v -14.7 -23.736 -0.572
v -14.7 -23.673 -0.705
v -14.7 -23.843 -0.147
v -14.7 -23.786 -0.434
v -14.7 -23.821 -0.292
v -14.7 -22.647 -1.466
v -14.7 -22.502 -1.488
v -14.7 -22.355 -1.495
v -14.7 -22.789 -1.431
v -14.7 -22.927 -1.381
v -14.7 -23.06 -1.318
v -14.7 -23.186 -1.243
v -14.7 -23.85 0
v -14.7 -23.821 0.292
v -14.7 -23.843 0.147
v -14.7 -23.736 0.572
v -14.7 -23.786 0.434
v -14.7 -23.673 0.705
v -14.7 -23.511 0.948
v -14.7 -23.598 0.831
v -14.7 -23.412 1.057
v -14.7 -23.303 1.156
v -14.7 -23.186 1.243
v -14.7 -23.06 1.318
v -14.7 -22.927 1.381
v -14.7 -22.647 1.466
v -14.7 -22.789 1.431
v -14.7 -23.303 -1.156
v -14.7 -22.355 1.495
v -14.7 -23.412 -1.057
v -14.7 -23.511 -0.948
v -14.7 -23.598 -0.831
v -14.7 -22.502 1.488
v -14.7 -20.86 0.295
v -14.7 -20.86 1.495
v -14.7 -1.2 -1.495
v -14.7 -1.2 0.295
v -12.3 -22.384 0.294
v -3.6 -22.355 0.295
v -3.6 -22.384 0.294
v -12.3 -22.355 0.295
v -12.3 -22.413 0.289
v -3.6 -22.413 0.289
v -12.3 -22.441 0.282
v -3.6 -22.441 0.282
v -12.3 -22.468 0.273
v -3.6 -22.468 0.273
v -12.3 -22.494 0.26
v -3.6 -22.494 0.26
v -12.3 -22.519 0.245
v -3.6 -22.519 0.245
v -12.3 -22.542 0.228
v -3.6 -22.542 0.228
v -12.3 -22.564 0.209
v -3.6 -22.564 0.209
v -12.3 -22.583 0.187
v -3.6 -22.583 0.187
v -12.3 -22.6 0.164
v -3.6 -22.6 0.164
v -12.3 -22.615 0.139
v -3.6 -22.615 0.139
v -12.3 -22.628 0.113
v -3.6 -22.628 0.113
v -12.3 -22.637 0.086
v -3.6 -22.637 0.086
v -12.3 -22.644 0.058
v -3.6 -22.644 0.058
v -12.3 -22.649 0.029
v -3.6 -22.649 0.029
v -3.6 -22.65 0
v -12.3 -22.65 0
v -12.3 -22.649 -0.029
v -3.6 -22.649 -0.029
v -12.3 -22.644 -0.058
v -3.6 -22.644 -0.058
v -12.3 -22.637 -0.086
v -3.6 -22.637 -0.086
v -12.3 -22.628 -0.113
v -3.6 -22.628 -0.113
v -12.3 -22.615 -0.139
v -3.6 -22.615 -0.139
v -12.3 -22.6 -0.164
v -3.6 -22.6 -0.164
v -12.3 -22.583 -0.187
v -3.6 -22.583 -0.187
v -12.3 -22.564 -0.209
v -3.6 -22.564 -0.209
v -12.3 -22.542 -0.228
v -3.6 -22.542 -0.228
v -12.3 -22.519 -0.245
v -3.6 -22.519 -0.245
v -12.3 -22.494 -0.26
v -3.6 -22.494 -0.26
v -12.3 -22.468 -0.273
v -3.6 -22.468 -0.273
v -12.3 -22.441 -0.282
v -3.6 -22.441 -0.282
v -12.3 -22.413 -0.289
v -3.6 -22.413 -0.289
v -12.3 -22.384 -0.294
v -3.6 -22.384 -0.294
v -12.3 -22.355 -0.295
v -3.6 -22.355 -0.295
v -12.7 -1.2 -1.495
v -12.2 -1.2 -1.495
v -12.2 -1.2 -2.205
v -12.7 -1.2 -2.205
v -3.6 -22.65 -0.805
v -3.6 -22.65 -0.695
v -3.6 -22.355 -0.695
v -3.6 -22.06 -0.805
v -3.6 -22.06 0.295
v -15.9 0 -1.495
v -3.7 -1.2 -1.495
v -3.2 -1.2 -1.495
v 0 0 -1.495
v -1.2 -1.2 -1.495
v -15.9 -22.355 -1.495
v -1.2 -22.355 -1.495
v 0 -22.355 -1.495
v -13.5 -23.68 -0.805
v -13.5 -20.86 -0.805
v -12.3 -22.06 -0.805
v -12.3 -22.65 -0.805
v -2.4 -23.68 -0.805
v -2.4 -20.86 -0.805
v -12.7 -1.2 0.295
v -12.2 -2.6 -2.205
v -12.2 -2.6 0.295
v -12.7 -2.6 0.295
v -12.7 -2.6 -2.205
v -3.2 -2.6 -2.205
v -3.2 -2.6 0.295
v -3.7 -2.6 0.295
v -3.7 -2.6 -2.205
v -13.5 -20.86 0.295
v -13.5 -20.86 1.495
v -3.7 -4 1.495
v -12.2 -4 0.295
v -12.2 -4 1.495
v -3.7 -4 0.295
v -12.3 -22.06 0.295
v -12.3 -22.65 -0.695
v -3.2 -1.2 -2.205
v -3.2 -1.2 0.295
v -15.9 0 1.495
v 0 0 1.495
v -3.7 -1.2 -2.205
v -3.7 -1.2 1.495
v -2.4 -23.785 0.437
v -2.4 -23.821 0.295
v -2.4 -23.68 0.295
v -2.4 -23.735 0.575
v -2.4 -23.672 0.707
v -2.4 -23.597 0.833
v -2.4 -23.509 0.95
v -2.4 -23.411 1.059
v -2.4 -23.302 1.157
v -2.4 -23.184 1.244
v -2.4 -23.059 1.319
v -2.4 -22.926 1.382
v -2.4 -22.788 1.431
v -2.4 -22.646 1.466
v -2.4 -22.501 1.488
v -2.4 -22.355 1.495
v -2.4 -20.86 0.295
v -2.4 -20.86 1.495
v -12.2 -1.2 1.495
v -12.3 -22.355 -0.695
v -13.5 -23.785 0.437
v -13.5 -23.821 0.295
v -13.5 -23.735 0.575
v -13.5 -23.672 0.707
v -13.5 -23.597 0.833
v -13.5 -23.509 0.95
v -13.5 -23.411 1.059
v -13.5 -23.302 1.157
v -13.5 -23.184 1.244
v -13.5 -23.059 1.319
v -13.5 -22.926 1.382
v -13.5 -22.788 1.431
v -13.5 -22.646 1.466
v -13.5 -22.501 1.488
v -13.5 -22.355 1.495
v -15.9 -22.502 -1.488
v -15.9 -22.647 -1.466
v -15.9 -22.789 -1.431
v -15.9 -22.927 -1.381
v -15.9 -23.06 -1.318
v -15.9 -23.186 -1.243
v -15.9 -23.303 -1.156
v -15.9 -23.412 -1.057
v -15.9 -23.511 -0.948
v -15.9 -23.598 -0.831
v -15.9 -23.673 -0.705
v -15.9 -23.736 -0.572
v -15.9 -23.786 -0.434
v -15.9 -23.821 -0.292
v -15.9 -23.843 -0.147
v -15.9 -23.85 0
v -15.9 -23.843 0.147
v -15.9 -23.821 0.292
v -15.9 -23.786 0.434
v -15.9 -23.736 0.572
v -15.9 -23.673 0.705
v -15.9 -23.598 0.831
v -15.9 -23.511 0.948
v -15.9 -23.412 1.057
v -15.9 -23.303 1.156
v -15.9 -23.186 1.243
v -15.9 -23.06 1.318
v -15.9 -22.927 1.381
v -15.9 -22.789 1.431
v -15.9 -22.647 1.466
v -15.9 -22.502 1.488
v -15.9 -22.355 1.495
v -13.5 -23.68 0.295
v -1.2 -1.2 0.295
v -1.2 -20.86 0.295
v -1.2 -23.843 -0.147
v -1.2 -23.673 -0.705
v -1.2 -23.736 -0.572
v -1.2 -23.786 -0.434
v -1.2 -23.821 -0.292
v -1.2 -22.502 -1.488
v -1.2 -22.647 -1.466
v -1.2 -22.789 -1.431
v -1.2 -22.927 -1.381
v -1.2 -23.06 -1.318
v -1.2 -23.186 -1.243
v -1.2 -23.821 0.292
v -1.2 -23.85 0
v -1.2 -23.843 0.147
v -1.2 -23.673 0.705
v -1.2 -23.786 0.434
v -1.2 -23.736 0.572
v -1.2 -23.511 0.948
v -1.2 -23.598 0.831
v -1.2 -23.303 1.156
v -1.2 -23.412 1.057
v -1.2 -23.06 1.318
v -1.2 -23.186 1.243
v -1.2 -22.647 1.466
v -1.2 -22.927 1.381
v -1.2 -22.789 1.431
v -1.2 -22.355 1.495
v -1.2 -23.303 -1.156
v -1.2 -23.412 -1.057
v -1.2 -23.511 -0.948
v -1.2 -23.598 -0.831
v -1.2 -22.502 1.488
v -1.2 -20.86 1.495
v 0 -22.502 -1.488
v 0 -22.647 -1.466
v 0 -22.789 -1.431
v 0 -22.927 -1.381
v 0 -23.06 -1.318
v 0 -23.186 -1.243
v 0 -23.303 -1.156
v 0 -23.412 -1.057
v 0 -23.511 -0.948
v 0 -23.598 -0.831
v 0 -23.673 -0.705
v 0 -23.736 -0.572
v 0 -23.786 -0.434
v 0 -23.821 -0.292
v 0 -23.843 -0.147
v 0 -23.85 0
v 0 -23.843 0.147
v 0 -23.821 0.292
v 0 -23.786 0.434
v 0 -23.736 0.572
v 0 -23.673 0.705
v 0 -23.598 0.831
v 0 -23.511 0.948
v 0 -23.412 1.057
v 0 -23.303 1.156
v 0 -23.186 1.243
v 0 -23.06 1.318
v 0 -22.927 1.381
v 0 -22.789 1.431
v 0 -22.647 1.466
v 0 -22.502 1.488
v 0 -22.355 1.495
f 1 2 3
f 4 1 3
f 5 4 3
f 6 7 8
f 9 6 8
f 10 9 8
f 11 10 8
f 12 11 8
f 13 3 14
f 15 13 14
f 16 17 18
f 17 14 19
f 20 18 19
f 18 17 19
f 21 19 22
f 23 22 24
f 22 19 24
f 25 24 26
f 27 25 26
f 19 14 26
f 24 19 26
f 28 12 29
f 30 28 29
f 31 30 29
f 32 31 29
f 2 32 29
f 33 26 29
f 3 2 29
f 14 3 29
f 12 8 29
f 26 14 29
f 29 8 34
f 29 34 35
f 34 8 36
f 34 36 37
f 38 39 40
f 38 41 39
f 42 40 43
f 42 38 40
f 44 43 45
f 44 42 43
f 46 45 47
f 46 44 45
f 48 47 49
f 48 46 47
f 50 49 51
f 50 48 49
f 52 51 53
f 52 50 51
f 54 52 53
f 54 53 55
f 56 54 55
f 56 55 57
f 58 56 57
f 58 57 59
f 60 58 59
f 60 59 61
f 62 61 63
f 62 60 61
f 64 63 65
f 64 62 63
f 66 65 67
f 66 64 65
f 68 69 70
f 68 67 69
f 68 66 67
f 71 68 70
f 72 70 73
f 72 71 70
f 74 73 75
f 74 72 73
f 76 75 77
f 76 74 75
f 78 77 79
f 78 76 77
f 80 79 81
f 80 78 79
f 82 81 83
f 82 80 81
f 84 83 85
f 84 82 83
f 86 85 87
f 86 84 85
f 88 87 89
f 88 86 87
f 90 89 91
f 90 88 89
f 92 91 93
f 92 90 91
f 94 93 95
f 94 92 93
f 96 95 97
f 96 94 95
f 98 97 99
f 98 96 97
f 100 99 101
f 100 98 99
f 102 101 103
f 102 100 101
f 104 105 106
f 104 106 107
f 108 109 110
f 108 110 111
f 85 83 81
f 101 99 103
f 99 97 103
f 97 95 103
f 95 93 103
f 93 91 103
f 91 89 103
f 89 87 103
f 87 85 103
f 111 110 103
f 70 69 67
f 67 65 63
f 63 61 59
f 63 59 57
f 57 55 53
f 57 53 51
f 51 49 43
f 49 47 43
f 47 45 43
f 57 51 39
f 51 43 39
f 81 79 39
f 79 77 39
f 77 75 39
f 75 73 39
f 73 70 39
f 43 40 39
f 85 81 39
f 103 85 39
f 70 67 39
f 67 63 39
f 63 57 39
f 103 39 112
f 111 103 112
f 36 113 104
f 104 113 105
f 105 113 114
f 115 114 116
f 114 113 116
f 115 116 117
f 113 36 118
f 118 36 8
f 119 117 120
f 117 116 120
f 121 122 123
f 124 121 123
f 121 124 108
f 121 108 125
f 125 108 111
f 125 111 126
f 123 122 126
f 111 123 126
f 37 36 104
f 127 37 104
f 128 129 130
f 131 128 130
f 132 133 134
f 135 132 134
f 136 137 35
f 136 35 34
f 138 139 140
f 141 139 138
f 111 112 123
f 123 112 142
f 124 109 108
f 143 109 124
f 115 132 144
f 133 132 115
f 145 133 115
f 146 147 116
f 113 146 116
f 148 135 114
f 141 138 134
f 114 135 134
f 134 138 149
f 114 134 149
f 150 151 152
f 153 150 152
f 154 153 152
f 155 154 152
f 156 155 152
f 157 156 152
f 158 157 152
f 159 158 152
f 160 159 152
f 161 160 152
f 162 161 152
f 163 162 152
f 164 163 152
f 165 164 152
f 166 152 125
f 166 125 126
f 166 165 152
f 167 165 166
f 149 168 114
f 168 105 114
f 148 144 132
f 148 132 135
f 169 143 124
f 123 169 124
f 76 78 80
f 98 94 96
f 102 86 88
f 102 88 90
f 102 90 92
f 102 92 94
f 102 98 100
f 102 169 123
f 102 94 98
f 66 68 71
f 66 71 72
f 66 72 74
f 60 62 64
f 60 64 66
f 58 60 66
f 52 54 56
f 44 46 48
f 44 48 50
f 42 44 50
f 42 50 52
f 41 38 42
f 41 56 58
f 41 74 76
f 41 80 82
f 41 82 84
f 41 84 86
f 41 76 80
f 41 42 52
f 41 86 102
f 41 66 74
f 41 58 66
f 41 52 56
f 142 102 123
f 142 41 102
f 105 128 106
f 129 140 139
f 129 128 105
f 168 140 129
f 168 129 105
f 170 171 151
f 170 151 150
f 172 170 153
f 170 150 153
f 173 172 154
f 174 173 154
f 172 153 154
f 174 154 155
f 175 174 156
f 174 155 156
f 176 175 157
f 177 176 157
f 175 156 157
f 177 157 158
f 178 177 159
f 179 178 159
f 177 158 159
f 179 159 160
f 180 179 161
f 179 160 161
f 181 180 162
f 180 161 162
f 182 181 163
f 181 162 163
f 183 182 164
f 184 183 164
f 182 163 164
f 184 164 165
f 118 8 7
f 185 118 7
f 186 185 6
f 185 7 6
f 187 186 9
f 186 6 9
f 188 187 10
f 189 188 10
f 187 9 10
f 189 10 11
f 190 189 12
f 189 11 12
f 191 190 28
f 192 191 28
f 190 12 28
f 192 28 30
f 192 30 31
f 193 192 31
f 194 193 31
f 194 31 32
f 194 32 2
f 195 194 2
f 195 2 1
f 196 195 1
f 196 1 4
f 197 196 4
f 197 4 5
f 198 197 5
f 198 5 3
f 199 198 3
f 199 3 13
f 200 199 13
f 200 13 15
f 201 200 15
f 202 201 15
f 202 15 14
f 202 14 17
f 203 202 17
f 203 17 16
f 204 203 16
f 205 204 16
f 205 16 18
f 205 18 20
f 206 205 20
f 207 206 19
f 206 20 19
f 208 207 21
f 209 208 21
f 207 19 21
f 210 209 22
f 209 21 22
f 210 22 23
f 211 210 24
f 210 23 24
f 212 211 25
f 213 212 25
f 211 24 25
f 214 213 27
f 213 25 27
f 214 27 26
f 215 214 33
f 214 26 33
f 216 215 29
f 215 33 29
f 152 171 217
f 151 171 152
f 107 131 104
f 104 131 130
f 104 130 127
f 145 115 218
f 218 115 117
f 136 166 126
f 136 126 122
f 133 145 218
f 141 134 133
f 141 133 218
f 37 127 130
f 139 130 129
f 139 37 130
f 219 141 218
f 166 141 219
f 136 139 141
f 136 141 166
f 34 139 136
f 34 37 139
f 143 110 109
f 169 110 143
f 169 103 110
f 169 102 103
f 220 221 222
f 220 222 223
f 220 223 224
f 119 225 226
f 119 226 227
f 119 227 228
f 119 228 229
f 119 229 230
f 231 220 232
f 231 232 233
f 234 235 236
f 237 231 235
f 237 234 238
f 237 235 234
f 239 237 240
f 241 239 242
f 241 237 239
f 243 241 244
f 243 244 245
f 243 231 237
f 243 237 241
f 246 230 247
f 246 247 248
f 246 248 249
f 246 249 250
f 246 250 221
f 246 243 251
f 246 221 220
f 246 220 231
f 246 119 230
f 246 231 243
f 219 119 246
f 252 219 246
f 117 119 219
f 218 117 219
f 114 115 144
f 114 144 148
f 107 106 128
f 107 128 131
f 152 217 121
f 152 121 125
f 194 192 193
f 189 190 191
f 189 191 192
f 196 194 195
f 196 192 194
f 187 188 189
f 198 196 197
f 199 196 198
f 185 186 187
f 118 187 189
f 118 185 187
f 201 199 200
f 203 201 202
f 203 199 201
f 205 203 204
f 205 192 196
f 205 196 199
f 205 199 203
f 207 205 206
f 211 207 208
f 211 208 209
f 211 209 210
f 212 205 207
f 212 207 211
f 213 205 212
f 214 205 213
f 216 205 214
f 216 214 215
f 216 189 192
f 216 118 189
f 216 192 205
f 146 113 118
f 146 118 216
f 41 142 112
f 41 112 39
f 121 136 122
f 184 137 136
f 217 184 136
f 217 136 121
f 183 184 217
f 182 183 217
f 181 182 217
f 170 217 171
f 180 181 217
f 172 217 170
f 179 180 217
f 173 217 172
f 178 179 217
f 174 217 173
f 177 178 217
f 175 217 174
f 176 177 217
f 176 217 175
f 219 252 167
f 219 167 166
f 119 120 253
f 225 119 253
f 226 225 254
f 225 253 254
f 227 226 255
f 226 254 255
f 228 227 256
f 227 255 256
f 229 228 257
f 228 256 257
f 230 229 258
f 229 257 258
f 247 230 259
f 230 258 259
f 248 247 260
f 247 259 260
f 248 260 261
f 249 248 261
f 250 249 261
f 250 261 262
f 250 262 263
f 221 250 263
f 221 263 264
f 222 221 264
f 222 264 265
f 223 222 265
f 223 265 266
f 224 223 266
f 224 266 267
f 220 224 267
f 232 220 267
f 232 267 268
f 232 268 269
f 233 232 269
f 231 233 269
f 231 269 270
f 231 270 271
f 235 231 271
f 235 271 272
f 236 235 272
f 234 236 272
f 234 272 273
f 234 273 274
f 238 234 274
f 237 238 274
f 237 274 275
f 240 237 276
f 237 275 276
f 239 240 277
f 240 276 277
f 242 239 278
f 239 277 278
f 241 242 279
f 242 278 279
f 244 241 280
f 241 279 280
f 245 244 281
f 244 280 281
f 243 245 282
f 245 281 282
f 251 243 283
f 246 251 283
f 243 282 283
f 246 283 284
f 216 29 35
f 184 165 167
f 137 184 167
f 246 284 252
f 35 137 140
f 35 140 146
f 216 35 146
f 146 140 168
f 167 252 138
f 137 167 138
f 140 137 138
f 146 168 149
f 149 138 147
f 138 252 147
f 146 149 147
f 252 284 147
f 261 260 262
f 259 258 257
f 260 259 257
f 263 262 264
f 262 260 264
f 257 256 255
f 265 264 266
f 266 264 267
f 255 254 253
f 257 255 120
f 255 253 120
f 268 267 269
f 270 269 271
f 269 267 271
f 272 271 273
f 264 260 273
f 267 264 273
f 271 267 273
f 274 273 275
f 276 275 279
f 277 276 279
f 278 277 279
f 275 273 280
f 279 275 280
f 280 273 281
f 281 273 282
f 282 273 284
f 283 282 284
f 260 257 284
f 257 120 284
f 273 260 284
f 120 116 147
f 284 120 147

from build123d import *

# Parameters (mm, degrees)
BOSS_EXTRUDE1_DEPTH     = 15.9
SHELL1_START            = -14.7
SHELL1_DEPTH            = 13.5
CUT_EXTRUDE1_DEPTH      = 29.819656487
CUT_EXTRUDE1_DEPTH_BACK = 29.819656487
SKETCH3_W               = 8.5
SKETCH3_H               = 2.8
CUT_EXTRUDE2_START      = -1.2
CUT_EXTRUDE2_DEPTH      = 1.2
LPATTERN1_COUNT         = 2
LPATTERN1_PITCH         = 12.3
SKETCH5_W               = 11.1
SKETCH5_H               = 2.99
CUT_EXTRUDE5_DEPTH      = 0.8
SKETCH6_W               = 8.7
SKETCH6_H               = 0.59
BOSS_EXTRUDE2_DEPTH     = 1.1
SKETCH7_W               = 11.1
SKETCH7_H               = 1.1
CUT_EXTRUDE6_DEPTH      = 0.17
SKETCH8_W               = 0.5
SKETCH8_H               = 1.4
BOSS_EXTRUDE3_DEPTH     = 2.5
LPATTERN2_COUNT         = 2
LPATTERN2_PITCH         = 9


# Read off the part's stored shape, not the designer's step: Shell1
with BuildPart() as part:
    # Sketch2 → Boss-Extrude1 (new body)
    with BuildSketch(Plane(origin=(0, 0, 0), x_dir=(0, 0, -1), z_dir=(1, 0, 0))):
        with BuildLine():
            Line((-1.495, 0), (1.495, 0))
            Line((1.495, 0), (1.495, -22.355))
            ThreePointArc((1.495, -22.355), (0, -23.85), (-1.495, -22.355))
            Line((-1.495, -22.355), (-1.495, 0))
        make_face()
    extrude(amount=-BOSS_EXTRUDE1_DEPTH)

    # Shell1 outline → Shell1 (cut)
    with BuildSketch(Plane.YZ.offset(SHELL1_START)):
        with BuildLine():
            Line((-22.355, -0.295), (-22.355, -1.495))
            Line((-22.355, -1.495), (-1.2, -1.495))
            Line((-1.2, -1.495), (-1.2, 0.295))
            Line((-1.2, 0.295), (-22.355, 0.295))
            ThreePointArc((-22.355, 0.295), (-22.65, 0), (-22.355, -0.295))
        make_face()
    extrude(amount=SHELL1_DEPTH, mode=Mode.SUBTRACT)

    # Sketch3 → Cut-Extrude1 (cut, two sides: drawn at the far end of the back side and taken through both)
    with BuildSketch(Plane.XY.offset(1.495).offset(-CUT_EXTRUDE1_DEPTH_BACK)):
        with Locations((-7.95, -2.6)):
            Rectangle(SKETCH3_W, SKETCH3_H)
    extrude(amount=CUT_EXTRUDE1_DEPTH + CUT_EXTRUDE1_DEPTH_BACK, mode=Mode.SUBTRACT)

    # Sketch4 → Cut-Extrude2 (cut)
    with BuildSketch(Plane.ZY.offset(14.7).offset(CUT_EXTRUDE2_START)):
        with BuildLine():
            Line((1.495, -20.86), (-1.495, -20.86))
            Line((-1.495, -20.86), (-1.495, -22.355))
            ThreePointArc((-1.495, -22.355), (0, -23.85), (1.495, -22.355))
            Line((1.495, -22.355), (1.495, -20.86))
        make_face()
    cut_extrude2 = extrude(amount=CUT_EXTRUDE2_DEPTH, mode=Mode.SUBTRACT)

    # LPattern1: Cut-Extrude2 ×2
    with Locations(*[(i * LPATTERN1_PITCH, 0, 0) for i in range(1, LPATTERN1_COUNT)]):
        add(cut_extrude2, mode=Mode.SUBTRACT)

    # Sketch5 → Cut-Extrude5 (cut)
    with BuildSketch(Plane(origin=(0, 0, -1.495), x_dir=(-1, 0, 0), z_dir=(0, 0, -1))):
        with Locations((7.95, -22.355)):
            Rectangle(SKETCH5_W, SKETCH5_H)
    extrude(amount=-CUT_EXTRUDE5_DEPTH, mode=Mode.SUBTRACT)

    # Sketch6 → Boss-Extrude2 (add)
    with BuildSketch(Plane(origin=(0, 0, 0.295), x_dir=(-1, 0, 0), z_dir=(0, 0, -1))):
        Polygon((2.4, -20.86), (13.5, -20.86), (13.5, -23.85), (12.3, -23.85), (3.6, -23.85), (2.4, -23.85), align=None)
        with Locations((7.95, -22.355)):
            Rectangle(SKETCH6_W, SKETCH6_H, mode=Mode.SUBTRACT)
    extrude(amount=BOSS_EXTRUDE2_DEPTH)

    # Sketch7 → Cut-Extrude6 (cut)
    with BuildSketch(Plane.XZ.offset(23.85)):
        with Locations((-7.95, -0.255)):
            Rectangle(SKETCH7_W, SKETCH7_H)
    extrude(amount=-CUT_EXTRUDE6_DEPTH, mode=Mode.SUBTRACT)

    # Sketch8 → Boss-Extrude3 (add)
    with BuildSketch(Plane(origin=(0, 0, 0.295), x_dir=(-1, 0, 0), z_dir=(0, 0, -1))):
        with Locations((3.45, -1.9)):
            Rectangle(SKETCH8_W, SKETCH8_H)
    boss_extrude3 = extrude(amount=BOSS_EXTRUDE3_DEPTH)

    # LPattern2: Boss-Extrude3 ×2
    with Locations(*[(-i * LPATTERN2_PITCH, 0, 0) for i in range(1, LPATTERN2_COUNT)]):
        add(boss_extrude3)


solid = part.part
